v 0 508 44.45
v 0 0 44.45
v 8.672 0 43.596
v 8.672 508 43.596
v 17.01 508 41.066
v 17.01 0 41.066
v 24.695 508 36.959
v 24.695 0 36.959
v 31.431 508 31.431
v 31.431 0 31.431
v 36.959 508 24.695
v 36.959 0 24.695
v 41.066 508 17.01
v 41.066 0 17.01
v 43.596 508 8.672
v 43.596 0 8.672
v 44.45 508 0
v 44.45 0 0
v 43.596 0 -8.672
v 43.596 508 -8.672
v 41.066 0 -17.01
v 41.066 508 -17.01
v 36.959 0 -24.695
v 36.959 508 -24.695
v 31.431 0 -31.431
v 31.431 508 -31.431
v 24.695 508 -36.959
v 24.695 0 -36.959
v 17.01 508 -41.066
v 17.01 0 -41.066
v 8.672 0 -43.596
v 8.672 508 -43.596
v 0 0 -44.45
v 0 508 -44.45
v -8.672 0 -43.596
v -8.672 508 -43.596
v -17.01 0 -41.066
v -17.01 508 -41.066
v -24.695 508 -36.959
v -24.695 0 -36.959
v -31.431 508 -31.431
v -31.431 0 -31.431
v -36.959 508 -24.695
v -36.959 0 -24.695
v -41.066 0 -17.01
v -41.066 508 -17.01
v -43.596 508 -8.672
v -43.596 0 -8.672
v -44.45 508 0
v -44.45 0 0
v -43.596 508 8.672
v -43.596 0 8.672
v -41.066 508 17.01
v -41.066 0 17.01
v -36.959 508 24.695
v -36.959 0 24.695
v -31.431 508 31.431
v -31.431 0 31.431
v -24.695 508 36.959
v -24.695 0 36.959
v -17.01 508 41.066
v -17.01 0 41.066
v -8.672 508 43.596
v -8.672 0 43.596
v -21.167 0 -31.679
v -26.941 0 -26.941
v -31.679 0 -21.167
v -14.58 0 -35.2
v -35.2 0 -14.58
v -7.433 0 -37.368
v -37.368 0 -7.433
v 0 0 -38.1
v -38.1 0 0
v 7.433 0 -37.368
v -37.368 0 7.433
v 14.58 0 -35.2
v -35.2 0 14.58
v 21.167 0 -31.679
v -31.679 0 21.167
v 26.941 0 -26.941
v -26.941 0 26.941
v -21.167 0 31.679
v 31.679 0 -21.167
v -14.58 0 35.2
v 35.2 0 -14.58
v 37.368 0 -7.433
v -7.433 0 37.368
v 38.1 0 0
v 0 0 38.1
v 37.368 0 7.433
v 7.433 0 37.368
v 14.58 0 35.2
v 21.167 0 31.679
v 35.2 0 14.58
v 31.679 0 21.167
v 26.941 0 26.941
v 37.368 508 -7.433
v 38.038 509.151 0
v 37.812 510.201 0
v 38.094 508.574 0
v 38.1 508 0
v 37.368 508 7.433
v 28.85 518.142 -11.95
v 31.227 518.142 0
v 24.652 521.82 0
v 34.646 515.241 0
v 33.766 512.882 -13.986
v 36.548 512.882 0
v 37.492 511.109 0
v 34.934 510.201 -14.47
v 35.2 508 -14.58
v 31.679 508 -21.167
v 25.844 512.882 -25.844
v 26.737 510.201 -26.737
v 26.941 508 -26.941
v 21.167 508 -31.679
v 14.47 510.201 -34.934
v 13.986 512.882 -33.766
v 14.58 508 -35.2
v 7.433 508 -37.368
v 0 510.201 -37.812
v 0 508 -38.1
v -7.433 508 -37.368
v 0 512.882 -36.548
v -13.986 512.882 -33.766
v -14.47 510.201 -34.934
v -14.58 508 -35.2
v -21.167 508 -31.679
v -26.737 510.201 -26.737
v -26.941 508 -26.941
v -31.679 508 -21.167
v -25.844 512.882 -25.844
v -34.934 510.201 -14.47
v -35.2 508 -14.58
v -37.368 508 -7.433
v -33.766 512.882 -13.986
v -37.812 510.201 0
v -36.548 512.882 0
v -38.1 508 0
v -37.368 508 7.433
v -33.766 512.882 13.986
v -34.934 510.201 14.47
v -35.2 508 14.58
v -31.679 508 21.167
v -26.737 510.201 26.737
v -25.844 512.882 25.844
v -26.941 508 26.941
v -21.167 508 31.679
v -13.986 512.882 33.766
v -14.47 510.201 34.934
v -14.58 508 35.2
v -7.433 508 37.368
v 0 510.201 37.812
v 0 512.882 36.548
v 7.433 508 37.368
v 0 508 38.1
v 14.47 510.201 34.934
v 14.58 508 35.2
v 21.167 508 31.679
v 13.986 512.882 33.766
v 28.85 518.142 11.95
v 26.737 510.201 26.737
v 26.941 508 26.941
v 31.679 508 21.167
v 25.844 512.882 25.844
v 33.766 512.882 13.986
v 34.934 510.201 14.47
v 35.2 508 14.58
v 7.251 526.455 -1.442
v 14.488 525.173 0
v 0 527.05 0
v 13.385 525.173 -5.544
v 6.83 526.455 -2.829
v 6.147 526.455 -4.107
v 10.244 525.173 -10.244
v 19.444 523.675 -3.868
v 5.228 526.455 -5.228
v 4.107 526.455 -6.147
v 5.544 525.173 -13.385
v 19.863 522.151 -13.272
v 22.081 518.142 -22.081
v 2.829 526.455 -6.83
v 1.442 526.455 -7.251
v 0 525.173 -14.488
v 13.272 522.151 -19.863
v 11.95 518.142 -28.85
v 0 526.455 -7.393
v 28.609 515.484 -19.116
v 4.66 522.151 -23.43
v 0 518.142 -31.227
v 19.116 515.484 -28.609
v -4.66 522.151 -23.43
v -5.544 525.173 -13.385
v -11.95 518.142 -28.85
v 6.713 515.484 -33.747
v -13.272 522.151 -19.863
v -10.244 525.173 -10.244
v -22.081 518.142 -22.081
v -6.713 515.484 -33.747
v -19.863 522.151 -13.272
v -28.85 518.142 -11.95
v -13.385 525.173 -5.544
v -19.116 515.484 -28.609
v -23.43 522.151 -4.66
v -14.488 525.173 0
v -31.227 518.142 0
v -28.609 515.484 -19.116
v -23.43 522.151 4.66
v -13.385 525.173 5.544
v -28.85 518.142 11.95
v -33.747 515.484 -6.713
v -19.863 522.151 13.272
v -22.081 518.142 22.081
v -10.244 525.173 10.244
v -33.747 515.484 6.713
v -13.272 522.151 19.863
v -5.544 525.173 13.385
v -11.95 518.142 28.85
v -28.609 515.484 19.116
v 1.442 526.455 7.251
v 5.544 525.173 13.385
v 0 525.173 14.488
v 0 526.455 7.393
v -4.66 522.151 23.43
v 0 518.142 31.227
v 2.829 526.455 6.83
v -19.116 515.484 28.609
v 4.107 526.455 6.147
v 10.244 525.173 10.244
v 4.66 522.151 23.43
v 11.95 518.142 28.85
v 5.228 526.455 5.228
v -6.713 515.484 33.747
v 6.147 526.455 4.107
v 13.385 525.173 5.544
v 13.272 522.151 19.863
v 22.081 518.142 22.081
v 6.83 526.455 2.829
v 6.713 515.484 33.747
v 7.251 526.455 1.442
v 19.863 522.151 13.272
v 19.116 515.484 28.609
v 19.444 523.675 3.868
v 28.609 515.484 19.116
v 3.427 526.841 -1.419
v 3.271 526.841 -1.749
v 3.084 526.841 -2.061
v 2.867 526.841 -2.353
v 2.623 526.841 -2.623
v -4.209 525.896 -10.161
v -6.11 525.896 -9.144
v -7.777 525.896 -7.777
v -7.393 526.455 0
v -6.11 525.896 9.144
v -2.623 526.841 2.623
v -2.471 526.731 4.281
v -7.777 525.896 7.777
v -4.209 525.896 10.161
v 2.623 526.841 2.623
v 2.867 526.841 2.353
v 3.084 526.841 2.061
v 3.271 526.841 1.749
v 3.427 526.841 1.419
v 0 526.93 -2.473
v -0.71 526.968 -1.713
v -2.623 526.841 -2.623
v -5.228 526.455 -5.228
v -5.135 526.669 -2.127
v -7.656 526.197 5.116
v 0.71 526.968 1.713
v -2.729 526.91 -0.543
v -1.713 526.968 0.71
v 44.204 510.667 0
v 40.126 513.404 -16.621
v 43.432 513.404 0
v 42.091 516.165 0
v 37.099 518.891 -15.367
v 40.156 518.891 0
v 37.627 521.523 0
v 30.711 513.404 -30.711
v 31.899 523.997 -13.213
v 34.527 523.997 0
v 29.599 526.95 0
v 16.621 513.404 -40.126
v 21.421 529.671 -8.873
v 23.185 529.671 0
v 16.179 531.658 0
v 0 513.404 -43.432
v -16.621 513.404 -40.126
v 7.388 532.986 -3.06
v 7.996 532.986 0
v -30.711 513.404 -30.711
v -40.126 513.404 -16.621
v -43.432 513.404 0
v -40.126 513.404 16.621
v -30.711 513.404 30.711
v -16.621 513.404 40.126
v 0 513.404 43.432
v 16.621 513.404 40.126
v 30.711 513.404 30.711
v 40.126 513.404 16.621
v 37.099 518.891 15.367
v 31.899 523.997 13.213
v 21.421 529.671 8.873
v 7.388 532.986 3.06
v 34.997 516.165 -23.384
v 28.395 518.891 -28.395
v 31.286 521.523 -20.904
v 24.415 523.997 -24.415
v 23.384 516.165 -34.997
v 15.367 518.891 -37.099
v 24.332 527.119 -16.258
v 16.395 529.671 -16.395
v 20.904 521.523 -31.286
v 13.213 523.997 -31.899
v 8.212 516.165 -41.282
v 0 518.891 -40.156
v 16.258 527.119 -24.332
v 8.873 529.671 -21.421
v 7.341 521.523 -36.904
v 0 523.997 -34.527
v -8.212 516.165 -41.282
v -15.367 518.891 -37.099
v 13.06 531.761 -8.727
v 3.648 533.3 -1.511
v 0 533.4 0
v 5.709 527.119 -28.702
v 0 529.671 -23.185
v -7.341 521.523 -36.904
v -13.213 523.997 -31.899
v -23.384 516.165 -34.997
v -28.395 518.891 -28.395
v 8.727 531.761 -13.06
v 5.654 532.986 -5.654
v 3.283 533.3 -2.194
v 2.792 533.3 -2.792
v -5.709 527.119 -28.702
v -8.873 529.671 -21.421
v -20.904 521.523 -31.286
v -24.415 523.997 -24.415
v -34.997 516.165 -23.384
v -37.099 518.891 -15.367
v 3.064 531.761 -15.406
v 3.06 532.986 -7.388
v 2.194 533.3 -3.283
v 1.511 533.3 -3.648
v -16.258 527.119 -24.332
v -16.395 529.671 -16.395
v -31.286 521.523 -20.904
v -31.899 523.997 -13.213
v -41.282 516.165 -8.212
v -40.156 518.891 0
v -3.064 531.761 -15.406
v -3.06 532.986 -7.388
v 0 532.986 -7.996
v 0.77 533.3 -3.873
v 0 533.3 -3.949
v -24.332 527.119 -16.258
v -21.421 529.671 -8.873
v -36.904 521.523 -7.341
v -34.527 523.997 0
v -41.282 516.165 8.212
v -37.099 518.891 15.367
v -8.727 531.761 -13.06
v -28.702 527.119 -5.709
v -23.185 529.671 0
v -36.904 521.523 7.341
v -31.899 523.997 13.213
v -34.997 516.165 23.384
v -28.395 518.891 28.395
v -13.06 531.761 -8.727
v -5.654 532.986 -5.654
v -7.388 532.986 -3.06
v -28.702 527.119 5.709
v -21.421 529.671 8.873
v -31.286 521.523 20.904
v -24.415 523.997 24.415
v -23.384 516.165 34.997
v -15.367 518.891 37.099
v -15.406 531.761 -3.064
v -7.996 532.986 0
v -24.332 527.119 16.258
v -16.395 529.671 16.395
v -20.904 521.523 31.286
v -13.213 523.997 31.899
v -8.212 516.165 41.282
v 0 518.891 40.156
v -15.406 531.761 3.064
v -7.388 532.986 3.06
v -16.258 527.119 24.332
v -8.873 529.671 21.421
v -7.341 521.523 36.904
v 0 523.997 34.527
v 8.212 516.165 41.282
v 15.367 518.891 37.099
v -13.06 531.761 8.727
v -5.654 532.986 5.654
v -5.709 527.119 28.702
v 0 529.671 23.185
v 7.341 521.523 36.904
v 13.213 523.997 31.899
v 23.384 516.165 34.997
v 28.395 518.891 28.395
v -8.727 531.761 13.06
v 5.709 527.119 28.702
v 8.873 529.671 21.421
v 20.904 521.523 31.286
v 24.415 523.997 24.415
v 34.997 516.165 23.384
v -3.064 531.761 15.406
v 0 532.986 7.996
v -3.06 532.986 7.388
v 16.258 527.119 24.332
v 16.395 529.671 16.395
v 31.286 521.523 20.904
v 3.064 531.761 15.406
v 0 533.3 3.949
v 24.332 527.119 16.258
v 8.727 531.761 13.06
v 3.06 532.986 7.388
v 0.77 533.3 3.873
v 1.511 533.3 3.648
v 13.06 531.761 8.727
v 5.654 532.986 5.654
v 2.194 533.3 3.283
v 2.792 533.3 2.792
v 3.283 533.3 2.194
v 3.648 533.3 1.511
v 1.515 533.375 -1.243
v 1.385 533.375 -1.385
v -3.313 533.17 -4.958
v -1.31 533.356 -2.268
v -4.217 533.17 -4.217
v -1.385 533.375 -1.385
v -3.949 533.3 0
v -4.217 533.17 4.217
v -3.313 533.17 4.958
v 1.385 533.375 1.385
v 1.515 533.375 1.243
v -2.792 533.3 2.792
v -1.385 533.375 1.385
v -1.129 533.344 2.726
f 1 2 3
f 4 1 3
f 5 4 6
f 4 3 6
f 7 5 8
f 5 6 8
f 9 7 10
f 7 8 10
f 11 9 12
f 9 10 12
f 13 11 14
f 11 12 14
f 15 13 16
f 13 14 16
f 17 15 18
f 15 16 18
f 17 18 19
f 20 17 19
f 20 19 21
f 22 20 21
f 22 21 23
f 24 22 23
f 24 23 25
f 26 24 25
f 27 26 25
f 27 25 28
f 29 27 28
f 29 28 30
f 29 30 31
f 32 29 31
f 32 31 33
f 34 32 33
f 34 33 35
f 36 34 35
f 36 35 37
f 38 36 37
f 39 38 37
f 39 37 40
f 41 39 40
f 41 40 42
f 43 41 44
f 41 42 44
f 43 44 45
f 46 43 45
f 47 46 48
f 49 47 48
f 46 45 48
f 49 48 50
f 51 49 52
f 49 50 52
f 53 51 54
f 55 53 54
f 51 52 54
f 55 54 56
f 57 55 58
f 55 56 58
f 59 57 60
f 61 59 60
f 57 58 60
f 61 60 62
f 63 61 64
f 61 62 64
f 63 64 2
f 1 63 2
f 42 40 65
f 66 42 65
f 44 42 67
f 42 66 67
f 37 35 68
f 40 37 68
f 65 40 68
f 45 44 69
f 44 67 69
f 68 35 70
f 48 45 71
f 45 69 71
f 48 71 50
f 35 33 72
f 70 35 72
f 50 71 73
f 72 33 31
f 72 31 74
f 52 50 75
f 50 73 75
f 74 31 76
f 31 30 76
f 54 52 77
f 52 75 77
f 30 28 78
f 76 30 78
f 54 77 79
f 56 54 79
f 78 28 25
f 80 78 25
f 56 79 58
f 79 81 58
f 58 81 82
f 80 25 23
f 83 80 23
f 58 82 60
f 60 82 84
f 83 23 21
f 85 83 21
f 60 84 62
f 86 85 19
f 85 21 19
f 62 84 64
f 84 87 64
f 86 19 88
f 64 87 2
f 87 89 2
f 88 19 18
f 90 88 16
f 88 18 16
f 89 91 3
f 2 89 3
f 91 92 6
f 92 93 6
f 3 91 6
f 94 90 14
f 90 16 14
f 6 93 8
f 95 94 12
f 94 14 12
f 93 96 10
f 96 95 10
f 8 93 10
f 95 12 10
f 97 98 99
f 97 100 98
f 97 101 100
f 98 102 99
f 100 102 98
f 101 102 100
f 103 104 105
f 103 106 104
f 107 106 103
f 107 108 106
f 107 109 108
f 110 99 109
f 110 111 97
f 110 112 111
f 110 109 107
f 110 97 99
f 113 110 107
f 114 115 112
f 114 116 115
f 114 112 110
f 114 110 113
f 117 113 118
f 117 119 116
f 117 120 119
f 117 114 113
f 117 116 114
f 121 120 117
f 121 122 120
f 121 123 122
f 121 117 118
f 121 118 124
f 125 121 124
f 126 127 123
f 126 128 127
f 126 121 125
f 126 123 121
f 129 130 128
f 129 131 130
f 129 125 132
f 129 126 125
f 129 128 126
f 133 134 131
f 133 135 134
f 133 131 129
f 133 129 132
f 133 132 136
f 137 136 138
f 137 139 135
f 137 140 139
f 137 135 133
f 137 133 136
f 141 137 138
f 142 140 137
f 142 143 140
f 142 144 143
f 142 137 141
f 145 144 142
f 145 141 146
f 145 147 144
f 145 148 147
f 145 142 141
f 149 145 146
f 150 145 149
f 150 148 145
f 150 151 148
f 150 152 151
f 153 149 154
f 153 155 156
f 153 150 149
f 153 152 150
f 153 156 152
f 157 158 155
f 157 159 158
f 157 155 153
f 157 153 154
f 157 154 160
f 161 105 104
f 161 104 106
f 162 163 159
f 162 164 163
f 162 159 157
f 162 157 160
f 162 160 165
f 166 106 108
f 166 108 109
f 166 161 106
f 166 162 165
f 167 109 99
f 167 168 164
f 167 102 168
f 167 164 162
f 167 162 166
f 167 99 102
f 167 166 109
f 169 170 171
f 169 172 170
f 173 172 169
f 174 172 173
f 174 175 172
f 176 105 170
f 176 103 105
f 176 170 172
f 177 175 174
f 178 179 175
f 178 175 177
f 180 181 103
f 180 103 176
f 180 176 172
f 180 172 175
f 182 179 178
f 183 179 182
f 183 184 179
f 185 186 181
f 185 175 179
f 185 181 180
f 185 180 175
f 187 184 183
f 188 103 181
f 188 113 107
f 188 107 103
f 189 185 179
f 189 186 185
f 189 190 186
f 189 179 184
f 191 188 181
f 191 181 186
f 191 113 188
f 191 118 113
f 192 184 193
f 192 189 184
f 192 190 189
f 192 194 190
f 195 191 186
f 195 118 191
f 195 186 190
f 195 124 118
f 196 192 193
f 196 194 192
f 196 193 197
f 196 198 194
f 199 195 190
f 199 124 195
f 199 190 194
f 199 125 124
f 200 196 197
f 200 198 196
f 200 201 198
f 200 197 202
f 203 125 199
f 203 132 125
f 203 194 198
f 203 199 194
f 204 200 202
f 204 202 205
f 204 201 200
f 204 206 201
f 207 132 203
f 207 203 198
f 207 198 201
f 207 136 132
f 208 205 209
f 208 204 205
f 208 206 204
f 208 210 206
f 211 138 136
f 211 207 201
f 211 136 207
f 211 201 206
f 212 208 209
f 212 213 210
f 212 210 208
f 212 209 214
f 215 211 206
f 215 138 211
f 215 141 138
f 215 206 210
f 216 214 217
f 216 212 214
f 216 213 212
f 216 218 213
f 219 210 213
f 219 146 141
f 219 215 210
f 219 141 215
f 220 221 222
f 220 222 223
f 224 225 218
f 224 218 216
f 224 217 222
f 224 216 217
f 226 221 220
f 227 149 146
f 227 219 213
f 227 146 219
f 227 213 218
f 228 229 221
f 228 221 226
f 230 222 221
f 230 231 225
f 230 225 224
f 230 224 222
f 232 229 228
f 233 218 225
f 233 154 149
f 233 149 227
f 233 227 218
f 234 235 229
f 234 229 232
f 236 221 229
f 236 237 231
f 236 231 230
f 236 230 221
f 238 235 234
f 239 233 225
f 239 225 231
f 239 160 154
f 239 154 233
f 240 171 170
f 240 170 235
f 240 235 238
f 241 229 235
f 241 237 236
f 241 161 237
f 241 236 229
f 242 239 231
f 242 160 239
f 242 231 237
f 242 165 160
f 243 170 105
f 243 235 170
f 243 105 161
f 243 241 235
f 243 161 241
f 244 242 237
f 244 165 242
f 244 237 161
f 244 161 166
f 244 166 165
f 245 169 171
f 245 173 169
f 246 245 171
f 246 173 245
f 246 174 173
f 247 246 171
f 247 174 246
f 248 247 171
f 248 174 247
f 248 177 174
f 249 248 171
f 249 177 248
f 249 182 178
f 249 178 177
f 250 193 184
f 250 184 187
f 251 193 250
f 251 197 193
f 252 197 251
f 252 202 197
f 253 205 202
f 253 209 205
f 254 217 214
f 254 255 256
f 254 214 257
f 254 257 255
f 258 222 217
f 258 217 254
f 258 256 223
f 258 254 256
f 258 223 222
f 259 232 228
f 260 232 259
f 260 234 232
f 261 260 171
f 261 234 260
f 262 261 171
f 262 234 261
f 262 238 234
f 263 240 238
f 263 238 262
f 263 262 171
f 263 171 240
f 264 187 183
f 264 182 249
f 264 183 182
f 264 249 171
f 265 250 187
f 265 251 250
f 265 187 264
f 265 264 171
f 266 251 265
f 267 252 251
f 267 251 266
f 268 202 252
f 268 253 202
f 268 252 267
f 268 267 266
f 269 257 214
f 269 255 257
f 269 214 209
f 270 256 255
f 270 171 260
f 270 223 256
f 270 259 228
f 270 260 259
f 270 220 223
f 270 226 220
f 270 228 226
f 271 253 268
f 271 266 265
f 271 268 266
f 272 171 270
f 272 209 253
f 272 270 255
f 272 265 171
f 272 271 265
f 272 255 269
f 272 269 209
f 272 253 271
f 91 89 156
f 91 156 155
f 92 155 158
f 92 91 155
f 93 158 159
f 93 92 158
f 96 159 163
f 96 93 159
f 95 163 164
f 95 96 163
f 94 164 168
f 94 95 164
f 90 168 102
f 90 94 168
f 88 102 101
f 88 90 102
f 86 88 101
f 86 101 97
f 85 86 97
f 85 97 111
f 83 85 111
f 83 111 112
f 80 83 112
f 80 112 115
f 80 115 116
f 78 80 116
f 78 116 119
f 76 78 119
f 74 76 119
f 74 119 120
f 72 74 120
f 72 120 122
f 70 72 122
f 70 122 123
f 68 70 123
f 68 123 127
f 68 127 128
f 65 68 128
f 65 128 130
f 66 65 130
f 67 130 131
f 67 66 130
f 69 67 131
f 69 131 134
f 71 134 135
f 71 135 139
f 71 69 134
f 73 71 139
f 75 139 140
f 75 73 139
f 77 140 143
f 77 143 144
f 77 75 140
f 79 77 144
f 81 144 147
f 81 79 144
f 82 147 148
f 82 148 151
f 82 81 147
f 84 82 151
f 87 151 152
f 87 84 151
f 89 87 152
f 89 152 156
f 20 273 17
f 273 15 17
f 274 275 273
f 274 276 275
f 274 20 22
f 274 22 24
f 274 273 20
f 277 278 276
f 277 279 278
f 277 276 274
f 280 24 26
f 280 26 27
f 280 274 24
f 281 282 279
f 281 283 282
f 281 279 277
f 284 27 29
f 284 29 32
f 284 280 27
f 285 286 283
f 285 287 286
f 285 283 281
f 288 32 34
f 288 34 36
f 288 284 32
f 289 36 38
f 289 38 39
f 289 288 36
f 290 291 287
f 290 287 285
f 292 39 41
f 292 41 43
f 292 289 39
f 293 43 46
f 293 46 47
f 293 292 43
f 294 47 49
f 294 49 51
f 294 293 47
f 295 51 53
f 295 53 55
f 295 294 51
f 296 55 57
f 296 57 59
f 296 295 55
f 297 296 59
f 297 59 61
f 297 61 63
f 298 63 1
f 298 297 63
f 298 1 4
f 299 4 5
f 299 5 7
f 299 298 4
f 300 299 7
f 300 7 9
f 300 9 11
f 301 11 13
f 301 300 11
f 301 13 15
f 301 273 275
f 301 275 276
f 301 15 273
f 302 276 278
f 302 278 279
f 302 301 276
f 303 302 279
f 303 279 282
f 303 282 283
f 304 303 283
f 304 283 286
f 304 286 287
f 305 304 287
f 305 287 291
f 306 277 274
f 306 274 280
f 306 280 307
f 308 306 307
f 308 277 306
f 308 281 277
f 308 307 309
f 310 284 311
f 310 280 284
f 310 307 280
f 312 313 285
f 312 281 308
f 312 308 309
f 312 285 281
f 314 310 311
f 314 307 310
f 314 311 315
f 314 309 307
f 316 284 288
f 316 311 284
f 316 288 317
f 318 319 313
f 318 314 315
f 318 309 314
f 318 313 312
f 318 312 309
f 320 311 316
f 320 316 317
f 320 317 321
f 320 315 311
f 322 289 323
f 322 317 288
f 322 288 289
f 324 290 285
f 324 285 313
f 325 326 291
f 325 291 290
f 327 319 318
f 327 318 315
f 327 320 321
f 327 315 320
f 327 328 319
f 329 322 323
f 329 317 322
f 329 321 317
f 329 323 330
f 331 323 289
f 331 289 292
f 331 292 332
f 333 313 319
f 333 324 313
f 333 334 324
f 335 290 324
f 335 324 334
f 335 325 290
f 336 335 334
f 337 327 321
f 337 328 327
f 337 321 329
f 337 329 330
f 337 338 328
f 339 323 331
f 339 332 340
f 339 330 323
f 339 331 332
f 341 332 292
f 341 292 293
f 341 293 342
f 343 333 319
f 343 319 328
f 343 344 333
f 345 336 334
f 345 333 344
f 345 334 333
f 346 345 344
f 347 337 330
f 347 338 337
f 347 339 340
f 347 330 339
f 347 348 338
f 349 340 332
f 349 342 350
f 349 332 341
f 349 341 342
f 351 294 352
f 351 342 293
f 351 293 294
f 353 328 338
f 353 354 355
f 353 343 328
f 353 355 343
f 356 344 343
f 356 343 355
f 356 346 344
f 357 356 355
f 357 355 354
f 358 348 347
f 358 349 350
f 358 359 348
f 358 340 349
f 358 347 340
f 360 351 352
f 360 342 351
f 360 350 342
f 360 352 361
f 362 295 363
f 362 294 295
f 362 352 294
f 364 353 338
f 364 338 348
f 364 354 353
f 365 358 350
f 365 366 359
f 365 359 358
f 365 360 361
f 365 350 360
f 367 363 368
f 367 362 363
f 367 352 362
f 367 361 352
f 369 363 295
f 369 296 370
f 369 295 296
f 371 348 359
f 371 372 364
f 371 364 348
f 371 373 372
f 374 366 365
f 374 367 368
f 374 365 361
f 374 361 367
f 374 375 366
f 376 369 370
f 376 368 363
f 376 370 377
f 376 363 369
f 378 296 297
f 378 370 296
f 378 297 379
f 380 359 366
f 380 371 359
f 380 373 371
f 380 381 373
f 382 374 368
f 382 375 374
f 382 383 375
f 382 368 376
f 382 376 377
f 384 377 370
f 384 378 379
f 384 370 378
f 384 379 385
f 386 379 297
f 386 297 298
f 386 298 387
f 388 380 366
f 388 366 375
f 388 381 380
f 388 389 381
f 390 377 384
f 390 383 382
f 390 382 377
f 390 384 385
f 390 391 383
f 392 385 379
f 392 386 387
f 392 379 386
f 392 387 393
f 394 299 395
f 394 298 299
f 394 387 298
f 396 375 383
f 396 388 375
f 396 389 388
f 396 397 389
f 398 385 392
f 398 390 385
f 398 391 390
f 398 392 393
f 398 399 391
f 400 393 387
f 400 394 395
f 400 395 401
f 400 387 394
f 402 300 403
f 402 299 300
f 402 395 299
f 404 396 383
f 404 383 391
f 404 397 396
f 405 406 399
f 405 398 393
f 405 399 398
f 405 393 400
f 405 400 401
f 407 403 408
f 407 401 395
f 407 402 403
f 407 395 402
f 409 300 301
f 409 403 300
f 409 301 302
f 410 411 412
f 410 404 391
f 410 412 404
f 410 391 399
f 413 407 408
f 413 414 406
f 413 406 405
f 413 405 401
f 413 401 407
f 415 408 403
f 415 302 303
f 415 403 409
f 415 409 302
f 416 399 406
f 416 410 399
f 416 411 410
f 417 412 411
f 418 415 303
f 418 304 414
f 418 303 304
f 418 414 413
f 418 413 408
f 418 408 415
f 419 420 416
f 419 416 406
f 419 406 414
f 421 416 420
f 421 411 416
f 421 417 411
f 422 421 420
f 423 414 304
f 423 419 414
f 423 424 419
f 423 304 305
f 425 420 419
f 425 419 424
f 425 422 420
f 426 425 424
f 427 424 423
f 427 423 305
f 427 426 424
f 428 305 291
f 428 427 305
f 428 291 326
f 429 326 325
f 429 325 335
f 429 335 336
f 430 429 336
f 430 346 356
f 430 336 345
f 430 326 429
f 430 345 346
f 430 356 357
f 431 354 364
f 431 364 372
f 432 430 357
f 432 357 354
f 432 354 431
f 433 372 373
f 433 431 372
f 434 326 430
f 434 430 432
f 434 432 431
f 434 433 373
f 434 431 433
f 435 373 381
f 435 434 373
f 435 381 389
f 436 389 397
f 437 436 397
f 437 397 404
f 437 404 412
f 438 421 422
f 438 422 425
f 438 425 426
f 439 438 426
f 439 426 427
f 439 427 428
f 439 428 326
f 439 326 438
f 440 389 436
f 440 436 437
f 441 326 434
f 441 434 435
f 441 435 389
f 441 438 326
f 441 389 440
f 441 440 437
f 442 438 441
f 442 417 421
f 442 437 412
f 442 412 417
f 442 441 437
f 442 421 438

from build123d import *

# Parameters (mm, degrees)
SKETCH1_R           = 44.45
SKETCH1_R_2         = 38.1
BOSS_EXTRUDE1_DEPTH = 508


with BuildPart() as part:
    # Sketch1 → Boss-Extrude1 (new body)
    with BuildSketch(Plane(origin=(0, 0, 0), x_dir=(1, 0, 0), z_dir=(0, 1, 0))):
        with Locations(Location((0, 0, 0), (0, 0, 270))):
            Circle(SKETCH1_R)
        with Locations(Location((0, 0, 0), (0, 0, 270))):
            Circle(SKETCH1_R_2, mode=Mode.SUBTRACT)
    extrude(amount=BOSS_EXTRUDE1_DEPTH)


with BuildPart() as body_2:
    # Sketch3 → Revolve1 (revolve)
    with BuildSketch(Plane.XY):
        with BuildLine():
            Line((0, 527.05), (0, 533.4))
            add(Edge.make_bspline(
                [(44.45, 508), (44.45, 533.4), (0, 533.4)],
                knots=[3.141592654, 3.141592654, 3.141592654, 4.71238898, 4.71238898, 4.71238898], degree=2, weights=[1, 0.707106781, 1]))
            Line((44.45, 508), (38.1, 508))
            add(Edge.make_bspline(
                [(0, 527.05), (2.705238138, 526.962603339), (8.16431522, 526.498297406), (15.910970109, 524.977430938), (22.919684869, 522.719322608), (28.844838794, 519.872132288), (33.407449824, 516.657966083), (36.416865038, 513.387356249), (37.655833073, 510.939796686), (38.066087901, 509.213893903), (38.113248081, 508.410075327), (38.1, 508)],
                knots=[0, 0, 0, 0, 0.196349541, 0.392699082, 0.589048623, 0.785398163, 0.981747704, 1.178097245, 1.374446786, 1.472621556, 1.570796327, 1.570796327, 1.570796327, 1.570796327], degree=3))
        make_face()
    revolve(axis=Axis((0, 527.05, 0), (0, 1, 0)))

    # Combine1: union part
    add(part.part)


solid = body_2.part
